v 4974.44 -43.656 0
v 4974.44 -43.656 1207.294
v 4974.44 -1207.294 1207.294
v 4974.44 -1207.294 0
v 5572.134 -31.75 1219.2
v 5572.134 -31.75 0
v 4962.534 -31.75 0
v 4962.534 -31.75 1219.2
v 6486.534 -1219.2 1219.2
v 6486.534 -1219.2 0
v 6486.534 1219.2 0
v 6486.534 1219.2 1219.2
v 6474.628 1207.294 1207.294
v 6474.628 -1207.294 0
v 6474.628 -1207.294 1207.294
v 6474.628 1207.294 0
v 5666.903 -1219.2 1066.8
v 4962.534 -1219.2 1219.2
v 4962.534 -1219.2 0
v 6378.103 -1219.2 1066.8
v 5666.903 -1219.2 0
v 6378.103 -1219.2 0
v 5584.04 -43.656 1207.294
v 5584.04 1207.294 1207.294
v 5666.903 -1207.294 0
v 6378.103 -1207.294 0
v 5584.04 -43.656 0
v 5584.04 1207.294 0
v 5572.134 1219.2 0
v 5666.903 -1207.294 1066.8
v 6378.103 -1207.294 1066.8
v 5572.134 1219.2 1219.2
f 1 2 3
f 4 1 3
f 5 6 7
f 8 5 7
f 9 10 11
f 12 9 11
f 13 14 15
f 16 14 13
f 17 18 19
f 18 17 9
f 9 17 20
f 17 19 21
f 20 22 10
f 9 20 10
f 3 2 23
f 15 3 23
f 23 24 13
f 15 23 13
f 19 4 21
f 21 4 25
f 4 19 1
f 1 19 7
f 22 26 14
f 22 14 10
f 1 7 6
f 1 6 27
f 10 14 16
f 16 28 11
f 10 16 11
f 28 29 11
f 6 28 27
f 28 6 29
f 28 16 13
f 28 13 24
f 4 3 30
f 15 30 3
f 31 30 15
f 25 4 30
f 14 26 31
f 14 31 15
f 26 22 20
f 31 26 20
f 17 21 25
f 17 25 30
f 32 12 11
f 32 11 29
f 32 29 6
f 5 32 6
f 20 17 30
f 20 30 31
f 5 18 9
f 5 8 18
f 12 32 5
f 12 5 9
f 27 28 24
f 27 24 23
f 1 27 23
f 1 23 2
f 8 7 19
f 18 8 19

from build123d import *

# Parameters (mm, degrees)
F1_DEPTH = 1219.2
F2_T     = -11.90625
F3_W     = 711.2
F3_H     = 1066.8
F4_DEPTH = 25.4


with BuildPart() as f1:
    # F0 (on Top) → F1 (new body)
    with BuildSketch(Plane.XY):
        Polygon((4962.533984375, -1219.2), (6486.533984375, -1219.2), (6486.533984375, 1219.2), (5572.133984375, 1219.2), (5572.133984375, -31.75), (4962.533984375, -31.75), align=None)
    extrude(amount=F1_DEPTH)

    # F2
    f2_openings = [f1.faces().sort_by_distance(p)[0] for p in [
        (5842.57907, -153.294659, 0),
    ]]
    offset(amount=F2_T, openings=f2_openings, kind=Kind.INTERSECTION)

    # F3 (on face) → F4 (cut)
    with BuildSketch(Plane.XZ.offset(1219.2)):
        with Locations((6022.5034957886, 533.4)):
            Rectangle(F3_W, F3_H)
    extrude(amount=-F4_DEPTH, mode=Mode.SUBTRACT)


solid = f1.part
